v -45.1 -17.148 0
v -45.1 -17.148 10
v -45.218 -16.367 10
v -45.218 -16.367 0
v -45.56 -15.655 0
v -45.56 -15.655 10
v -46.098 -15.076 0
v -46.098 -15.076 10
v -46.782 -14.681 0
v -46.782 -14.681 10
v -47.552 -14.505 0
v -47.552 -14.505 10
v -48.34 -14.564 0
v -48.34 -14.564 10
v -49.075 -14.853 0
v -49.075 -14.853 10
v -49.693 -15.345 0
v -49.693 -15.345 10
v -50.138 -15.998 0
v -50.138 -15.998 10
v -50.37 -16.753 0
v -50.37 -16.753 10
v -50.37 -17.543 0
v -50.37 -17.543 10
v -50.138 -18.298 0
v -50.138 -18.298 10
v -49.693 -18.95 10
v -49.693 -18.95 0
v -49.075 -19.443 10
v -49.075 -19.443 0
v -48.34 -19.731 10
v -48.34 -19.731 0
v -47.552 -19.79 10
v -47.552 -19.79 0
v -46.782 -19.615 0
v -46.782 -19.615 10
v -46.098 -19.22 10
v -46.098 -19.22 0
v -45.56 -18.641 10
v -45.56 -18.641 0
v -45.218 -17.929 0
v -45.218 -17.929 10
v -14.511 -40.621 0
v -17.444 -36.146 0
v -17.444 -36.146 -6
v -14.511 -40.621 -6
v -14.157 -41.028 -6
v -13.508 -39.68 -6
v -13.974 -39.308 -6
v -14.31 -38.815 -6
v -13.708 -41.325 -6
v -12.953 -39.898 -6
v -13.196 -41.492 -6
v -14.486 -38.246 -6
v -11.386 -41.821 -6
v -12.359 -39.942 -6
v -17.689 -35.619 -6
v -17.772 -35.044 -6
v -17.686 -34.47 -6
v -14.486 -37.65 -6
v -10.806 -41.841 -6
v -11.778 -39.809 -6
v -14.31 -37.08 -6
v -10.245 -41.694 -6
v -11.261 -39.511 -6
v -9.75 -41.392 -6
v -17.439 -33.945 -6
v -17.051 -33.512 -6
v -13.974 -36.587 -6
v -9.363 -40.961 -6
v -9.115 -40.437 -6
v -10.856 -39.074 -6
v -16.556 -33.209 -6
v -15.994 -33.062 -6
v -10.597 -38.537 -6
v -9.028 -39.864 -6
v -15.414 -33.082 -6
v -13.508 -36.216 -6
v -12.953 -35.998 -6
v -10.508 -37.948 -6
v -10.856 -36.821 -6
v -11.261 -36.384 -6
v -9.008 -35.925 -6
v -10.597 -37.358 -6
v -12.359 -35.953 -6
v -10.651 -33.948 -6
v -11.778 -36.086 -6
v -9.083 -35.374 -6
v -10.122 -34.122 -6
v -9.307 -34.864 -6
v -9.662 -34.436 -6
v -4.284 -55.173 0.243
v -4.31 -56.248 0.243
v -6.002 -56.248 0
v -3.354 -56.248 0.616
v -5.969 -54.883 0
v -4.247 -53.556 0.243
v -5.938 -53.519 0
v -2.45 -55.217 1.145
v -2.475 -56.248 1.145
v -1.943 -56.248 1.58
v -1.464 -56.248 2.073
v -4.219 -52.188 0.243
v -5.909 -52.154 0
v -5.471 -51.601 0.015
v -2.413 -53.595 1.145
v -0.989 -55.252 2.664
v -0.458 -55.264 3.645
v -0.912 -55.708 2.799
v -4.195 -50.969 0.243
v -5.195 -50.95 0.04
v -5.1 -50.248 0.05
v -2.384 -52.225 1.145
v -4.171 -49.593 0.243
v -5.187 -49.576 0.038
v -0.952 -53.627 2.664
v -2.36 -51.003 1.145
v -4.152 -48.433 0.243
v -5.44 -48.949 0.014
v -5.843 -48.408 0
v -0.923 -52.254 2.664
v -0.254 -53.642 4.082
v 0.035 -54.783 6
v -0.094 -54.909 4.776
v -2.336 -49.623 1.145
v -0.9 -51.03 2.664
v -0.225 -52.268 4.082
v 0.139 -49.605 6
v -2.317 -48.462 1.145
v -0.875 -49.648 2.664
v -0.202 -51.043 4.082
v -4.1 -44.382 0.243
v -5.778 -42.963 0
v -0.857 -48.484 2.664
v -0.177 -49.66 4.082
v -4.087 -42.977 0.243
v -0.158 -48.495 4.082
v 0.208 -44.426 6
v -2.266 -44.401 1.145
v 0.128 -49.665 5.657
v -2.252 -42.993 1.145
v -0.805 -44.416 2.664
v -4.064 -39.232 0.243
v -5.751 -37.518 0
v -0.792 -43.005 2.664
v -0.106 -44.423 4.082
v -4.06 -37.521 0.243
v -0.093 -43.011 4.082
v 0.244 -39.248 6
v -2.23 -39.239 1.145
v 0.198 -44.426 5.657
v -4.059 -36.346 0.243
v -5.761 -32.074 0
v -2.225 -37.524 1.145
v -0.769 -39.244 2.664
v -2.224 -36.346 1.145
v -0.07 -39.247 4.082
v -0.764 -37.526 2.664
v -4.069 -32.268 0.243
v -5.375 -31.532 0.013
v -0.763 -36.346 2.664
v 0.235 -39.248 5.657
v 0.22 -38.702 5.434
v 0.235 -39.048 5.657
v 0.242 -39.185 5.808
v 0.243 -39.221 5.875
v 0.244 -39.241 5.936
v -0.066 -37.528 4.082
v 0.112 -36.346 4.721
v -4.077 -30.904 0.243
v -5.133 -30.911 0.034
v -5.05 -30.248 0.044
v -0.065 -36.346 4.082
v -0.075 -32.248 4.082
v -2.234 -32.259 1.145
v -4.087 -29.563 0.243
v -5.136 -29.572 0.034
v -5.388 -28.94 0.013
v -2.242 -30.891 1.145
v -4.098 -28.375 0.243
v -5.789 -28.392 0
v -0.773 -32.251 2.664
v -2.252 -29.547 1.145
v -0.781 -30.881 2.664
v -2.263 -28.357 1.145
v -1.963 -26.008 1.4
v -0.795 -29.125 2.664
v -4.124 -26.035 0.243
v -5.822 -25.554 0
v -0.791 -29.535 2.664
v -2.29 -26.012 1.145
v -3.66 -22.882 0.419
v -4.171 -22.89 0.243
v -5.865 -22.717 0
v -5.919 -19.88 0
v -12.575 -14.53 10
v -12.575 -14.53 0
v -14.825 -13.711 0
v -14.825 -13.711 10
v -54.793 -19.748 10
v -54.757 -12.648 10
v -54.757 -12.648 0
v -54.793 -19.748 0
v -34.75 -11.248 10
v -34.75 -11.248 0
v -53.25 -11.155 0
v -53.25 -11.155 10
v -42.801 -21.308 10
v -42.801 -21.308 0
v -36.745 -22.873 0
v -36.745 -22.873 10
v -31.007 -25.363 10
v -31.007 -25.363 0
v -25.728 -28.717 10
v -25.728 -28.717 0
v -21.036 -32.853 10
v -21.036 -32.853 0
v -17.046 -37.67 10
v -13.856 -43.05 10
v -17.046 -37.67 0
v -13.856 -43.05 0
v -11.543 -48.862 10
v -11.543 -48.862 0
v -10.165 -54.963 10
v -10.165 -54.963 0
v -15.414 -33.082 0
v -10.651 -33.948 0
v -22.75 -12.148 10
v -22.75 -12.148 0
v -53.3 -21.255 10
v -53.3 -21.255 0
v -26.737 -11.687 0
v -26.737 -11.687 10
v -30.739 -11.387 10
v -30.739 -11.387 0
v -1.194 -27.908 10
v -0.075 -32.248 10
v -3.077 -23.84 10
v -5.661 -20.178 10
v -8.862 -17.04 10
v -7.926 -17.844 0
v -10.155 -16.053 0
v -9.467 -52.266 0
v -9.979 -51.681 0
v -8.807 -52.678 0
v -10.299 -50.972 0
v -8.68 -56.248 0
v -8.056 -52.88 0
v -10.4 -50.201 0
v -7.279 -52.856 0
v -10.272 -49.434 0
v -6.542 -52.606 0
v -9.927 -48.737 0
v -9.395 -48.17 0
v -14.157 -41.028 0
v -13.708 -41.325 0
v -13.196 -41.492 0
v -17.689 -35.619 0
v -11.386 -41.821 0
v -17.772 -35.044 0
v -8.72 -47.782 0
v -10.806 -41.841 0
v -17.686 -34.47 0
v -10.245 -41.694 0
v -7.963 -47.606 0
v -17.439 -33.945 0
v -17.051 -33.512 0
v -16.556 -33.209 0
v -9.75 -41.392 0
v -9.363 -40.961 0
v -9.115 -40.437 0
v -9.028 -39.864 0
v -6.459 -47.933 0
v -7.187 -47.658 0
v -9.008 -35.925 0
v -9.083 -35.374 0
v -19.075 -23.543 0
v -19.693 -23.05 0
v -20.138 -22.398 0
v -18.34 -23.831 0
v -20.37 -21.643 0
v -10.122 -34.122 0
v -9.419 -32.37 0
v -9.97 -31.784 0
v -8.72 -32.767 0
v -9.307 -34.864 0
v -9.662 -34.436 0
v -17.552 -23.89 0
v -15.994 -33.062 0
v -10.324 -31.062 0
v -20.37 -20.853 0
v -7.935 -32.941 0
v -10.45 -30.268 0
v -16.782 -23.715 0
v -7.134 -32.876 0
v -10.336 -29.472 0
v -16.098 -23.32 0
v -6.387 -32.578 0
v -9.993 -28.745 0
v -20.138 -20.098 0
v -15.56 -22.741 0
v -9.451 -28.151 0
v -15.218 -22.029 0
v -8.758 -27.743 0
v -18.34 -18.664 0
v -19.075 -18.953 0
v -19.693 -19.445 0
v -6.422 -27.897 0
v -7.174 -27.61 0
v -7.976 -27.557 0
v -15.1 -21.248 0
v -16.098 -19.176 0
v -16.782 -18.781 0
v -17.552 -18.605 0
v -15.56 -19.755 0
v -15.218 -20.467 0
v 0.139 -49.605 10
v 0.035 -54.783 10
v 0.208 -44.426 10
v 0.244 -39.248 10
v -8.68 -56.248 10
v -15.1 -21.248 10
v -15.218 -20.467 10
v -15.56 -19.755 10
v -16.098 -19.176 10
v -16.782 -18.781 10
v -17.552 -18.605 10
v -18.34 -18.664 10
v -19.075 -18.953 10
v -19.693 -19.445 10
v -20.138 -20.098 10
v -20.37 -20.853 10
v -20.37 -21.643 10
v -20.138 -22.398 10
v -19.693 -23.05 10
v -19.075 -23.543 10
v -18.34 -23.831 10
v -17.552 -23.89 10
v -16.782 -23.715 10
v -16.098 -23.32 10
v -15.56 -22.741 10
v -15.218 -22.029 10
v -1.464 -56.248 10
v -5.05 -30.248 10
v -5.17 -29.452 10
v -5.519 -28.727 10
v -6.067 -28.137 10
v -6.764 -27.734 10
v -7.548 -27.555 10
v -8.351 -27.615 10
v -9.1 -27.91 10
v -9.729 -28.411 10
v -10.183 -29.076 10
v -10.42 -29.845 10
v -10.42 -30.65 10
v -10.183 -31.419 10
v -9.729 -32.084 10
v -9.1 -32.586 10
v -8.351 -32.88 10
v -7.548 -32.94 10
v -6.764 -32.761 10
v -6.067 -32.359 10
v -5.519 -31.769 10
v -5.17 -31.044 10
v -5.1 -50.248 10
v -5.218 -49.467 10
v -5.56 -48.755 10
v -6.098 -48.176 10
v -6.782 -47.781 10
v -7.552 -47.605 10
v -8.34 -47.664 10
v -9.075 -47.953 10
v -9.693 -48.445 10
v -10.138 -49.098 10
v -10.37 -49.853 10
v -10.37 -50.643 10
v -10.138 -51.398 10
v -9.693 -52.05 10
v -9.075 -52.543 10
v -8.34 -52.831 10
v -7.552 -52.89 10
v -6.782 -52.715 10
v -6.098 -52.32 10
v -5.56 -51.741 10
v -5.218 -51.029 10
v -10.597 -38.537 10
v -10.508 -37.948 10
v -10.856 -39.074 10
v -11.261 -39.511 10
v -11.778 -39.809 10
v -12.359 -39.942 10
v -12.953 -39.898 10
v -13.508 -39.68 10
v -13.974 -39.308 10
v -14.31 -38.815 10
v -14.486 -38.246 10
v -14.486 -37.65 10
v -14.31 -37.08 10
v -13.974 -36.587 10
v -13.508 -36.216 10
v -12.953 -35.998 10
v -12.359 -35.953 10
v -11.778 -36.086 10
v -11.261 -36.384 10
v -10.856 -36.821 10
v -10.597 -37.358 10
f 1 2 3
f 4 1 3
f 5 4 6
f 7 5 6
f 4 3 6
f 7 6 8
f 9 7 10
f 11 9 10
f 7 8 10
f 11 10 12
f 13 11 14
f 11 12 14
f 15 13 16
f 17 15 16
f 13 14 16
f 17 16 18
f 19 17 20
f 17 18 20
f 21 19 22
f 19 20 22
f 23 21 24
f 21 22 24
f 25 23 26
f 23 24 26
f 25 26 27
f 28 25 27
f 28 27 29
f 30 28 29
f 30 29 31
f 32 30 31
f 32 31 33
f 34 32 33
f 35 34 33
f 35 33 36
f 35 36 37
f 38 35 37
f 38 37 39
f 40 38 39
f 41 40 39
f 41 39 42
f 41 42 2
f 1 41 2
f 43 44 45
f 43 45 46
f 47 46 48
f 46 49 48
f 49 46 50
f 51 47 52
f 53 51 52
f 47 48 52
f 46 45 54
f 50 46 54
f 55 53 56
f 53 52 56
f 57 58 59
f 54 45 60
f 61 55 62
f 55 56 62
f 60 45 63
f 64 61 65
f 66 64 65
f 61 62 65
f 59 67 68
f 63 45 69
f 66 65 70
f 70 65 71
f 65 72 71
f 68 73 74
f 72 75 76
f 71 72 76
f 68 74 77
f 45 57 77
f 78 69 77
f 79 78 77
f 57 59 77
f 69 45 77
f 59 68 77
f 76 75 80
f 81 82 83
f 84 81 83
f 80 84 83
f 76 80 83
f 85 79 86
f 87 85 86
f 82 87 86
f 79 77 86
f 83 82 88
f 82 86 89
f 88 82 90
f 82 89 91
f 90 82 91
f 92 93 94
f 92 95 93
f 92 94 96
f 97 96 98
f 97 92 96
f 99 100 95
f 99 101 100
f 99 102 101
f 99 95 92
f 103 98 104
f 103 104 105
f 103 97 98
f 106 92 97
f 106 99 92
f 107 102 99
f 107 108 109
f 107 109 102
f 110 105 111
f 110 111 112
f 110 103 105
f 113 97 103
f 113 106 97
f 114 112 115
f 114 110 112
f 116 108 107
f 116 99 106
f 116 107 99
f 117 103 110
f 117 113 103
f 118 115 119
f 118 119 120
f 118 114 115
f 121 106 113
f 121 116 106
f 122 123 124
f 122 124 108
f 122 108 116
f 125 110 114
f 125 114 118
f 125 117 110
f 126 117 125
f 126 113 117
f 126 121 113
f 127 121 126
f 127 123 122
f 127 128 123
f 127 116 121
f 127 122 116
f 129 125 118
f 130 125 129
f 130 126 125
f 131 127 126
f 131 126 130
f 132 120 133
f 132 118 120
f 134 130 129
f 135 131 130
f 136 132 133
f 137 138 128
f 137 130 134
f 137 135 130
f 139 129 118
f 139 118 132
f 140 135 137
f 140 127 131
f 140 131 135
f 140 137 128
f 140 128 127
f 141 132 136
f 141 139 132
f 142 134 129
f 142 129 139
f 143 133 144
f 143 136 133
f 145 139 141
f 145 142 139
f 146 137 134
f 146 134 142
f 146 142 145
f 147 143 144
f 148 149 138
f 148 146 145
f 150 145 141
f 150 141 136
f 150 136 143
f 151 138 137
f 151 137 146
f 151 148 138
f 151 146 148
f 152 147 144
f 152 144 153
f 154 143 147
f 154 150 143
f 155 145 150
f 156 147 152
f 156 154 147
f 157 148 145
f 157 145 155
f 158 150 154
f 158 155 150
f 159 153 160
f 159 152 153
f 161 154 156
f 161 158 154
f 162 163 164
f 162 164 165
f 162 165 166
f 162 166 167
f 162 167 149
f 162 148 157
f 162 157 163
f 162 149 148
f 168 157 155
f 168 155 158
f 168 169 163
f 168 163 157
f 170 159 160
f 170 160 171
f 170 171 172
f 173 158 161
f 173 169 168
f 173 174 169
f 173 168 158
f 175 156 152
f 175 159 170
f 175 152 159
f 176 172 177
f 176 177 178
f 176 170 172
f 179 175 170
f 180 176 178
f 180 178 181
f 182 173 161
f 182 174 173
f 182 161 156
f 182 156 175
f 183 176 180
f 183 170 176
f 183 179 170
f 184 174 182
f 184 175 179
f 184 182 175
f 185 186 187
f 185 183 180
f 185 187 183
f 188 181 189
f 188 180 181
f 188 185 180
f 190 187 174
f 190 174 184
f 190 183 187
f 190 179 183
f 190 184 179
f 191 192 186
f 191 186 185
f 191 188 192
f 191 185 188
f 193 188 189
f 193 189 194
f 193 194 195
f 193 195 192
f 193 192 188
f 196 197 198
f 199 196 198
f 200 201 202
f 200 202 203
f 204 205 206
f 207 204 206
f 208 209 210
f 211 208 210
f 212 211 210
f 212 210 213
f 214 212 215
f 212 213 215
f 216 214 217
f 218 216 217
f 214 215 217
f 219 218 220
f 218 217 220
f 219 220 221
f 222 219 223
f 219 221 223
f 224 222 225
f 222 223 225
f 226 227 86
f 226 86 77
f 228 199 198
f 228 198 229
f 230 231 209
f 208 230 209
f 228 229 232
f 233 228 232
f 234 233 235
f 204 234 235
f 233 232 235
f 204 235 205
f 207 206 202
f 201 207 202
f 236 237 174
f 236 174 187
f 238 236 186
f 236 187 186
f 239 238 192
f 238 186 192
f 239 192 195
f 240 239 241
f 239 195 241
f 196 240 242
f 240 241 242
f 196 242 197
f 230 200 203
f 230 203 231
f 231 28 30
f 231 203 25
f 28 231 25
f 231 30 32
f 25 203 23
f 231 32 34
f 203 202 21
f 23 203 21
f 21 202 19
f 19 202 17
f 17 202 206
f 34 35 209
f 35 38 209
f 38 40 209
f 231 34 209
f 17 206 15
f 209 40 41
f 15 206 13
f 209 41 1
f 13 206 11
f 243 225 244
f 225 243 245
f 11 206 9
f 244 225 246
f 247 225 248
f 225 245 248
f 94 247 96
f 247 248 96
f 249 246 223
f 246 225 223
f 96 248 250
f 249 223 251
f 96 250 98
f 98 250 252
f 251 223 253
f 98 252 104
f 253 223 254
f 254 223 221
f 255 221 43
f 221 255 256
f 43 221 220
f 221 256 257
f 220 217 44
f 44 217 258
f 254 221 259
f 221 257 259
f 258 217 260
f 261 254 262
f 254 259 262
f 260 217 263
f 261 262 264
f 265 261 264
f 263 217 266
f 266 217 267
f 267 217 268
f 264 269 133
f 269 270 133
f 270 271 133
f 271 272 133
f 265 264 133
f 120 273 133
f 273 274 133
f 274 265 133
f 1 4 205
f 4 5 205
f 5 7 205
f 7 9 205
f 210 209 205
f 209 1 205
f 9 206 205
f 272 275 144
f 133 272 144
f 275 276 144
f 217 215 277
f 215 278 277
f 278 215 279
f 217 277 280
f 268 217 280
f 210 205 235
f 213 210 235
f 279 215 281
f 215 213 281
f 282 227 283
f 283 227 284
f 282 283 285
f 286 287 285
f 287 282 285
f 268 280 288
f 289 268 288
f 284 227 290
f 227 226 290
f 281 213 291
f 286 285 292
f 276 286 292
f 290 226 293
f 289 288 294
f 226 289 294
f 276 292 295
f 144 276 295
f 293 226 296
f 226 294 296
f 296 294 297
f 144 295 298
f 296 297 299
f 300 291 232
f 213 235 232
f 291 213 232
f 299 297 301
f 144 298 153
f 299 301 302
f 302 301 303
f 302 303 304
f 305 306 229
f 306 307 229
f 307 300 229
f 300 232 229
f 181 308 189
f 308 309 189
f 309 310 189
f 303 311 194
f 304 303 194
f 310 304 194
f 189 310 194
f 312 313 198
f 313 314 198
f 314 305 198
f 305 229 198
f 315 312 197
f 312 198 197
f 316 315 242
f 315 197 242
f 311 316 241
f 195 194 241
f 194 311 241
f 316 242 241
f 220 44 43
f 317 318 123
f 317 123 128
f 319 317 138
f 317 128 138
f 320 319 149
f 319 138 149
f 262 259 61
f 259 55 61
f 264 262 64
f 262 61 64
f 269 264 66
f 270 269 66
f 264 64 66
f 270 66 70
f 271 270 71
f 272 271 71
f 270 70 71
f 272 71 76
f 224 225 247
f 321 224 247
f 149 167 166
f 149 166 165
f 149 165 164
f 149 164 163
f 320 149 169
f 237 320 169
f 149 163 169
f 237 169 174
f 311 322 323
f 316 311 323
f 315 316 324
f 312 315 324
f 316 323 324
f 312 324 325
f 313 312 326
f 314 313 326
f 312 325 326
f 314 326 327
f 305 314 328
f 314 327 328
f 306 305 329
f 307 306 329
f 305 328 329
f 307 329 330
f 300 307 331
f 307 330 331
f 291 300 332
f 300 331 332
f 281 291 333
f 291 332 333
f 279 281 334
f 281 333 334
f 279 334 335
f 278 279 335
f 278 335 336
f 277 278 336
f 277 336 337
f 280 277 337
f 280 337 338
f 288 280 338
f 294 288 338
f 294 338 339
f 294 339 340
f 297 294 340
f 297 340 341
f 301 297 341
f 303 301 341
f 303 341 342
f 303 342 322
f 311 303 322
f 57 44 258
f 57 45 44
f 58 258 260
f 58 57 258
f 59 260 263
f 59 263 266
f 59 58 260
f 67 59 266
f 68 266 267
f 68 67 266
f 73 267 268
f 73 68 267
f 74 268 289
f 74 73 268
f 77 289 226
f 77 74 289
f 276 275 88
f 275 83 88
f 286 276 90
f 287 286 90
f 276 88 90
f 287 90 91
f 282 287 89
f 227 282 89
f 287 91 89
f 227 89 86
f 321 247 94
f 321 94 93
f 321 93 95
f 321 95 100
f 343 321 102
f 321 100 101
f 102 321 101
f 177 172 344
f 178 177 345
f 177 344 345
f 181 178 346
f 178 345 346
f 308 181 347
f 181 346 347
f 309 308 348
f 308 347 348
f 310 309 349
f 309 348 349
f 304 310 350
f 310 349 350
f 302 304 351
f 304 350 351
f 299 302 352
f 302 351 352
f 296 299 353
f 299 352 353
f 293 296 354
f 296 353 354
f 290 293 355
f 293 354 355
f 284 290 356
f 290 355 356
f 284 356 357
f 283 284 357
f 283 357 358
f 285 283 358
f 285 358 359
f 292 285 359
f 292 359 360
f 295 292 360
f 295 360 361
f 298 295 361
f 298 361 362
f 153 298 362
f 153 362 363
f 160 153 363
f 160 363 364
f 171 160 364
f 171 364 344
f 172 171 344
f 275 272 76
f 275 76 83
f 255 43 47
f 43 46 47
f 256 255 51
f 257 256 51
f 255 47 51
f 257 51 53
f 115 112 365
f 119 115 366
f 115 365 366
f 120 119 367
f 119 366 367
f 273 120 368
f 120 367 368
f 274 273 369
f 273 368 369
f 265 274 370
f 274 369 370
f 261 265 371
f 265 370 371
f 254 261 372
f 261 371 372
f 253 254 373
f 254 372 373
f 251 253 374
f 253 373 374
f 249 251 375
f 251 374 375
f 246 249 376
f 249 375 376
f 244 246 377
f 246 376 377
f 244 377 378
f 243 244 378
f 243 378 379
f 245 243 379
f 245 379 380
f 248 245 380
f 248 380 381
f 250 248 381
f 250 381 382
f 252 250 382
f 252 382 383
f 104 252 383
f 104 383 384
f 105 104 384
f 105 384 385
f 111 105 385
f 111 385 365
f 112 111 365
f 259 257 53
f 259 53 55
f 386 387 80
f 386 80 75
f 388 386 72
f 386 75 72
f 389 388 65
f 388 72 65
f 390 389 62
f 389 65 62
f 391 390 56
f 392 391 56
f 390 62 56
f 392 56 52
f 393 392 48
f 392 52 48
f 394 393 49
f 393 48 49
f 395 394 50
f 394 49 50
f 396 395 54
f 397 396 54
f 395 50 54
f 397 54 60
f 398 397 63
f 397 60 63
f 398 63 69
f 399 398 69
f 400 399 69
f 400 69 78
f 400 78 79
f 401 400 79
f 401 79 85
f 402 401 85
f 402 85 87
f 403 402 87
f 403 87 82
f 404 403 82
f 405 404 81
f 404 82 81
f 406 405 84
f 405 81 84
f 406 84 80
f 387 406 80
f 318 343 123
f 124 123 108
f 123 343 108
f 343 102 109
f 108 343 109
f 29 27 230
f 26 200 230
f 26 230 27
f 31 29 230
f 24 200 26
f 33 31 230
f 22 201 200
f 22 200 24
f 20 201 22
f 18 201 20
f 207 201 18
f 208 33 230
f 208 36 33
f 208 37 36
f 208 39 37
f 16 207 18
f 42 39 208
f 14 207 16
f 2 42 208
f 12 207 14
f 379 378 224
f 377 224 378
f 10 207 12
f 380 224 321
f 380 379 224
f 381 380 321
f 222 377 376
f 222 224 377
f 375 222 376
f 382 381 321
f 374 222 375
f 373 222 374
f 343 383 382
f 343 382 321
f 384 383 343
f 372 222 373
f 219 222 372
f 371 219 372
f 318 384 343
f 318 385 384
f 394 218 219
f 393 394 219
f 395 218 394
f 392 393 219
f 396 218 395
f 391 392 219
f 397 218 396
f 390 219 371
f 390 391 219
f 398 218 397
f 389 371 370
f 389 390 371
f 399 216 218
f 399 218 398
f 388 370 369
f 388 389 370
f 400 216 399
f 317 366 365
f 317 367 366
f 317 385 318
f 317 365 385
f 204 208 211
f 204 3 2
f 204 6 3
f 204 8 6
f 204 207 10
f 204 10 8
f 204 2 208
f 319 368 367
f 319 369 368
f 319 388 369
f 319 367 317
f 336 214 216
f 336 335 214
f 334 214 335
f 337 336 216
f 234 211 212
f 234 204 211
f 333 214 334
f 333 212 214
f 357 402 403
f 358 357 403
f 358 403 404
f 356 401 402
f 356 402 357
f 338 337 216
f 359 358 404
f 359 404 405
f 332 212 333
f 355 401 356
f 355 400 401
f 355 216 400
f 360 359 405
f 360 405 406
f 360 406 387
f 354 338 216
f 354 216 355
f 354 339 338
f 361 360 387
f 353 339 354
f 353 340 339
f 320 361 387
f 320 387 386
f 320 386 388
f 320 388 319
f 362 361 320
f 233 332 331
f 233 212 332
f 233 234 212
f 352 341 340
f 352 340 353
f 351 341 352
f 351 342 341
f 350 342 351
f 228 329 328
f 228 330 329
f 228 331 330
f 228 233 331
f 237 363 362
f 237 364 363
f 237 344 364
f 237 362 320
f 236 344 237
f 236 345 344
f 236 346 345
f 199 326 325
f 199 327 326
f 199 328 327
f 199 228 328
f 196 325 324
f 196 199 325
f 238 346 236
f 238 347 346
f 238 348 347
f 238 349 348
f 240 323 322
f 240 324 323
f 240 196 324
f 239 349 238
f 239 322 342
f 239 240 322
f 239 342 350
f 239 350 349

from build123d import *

# Parameters (mm, degrees)
F1_DEPTH    = 10
F2_R        = 2.65
F2_R_2      = 2.7
F3_DEPTH    = 10.001
F4_T2_ANGLE = 6.3743045961
F6_DEPTH    = 6
F7_R        = 2
F8_T1_DEPTH = 17.7150489639
F8_T3_DEPTH = 16.827176909
F8_T5_DEPTH = 14.1871505468
F9_T1_DEPTH = 16.8101610382
F10_R       = 2
F11_DEPTH   = 16


# Not quite as in the source:
# - a fillet or chamfer that OpenCascade refuses, or shapes differently, is made with other operations: its cross-section is extruded or revolved along the edge and cut away or added
# - a feature names something its author has since deleted; it is built from what else it names


with BuildPart() as f1:
    # F0 (on Top) → F1 (new body)
    with BuildSketch(Plane.XY):
        with BuildLine():
            Line((-34.7499609253, -11.2477834763), (-54.7499609253, -11.1477834763))
            Line((-54.7499609253, -11.1477834763), (-54.8004609253, -21.2477834763))
            Line((-54.8004609253, -21.2477834763), (-42.8006109225, -21.3077827264))
            ThreePointArc((-42.8006109225, -21.3077827264), (-20.5885311059, -33.3218659489), (-10, -56.2477834763))
            Line((-10, -56.2477834763), (0, -56.2477834763))
            ThreePointArc((0, -56.2477834763), (0.1673692192, -47.7484327866), (0.2444140549, -39.2477834763))
            Line((0.2444140549, -39.2477834763), (-0.07466726, -32.2477834763))
            ThreePointArc((-0.07466726, -32.2477834763), (-4.6744272783, -21.4152799032), (-13.7499609253, -13.9229094565))
            Line((-13.7499609253, -13.9229094565), (-22.7499609253, -12.1477834763))
            ThreePointArc((-22.7499609253, -12.1477834763), (-28.7364107349, -11.5171142711), (-34.7499609253, -11.2477834763))
        make_face()
    extrude(amount=F1_DEPTH)

    # F2 (on face) → F3 (cut, through all)
    with BuildSketch(Plane.XY.offset(10)):
        with Locations((-47.7499609253, -17.1477834763)):
            Circle(F2_R)
        with Locations((-17.7499609253, -21.2477834763)):
            Circle(F2_R)
        with Locations((-7.7499609253, -50.2477834763)):
            Circle(F2_R)
        with Locations((-7.7499609253, -30.2477834763)):
            Circle(F2_R_2)
    extrude(amount=-F3_DEPTH, mode=Mode.SUBTRACT)

    # F4: fillet of radius 6 on 1 edges, made by hand

    # F4_s1 → F4_t2 (revolve, cut)
    with BuildSketch(Plane(origin=(-6.441827323, -91.8723118046, 0), x_dir=(0, 0, 1), z_dir=(-0.0699454492, -0.9975508178, 0))):
        with BuildLine():
            ThreePointArc((0, 1.2558600799), (1.7573593129, -2.9867806073), (6, -4.7441399201))
            Line((6, -4.7441399201), (6, -4.8641399201))
            Line((6, -4.8641399201), (-0.12, -4.8641399201))
            Line((-0.12, -4.8641399201), (-0.12, 1.2558600799))
            Line((-0.12, 1.2558600799), (0, 1.2558600799))
        make_face()
    revolve(axis=Axis((-799.7499609255, -36.2477834763, 0), (0, 0, 1)), revolution_arc=F4_T2_ANGLE, mode=Mode.SUBTRACT)

    # F5 (on face) → F6 (join)
    with BuildSketch(Plane.XY):
        Polygon((-20, -32.2477834763), (-14.04, -41.3386925673), (-9.04, -42.2477834763), (-9, -34.2477834763), align=None)
    extrude(amount=-F6_DEPTH)

    # F7
    f7_edges = [f1.edges().sort_by_distance(p)[0] for p in [
        (-9, -34.247783, -3),
        (-20, -32.247783, -3),
        (-14.04, -41.338693, -3),
        (-9.04, -42.247783, -3),
    ]]
    fillet(f7_edges, radius=F7_R)

    # F8: chamfer of 1.5 on 4 edges, made by hand

    # F8_s2 → F8_t1 (cut)
    with BuildSketch(Plane.XY.offset(-3.8575244819)):
        Polygon((-53.2499796749, -11.1552833826), (-54.7574608315, -12.6477647267), (-54.7499609253, -11.1477834763), align=None)
        Polygon((-54.792961019, -19.747802226), (-53.3004796749, -21.2552833826), (-54.8004609253, -21.2477834763), align=None)
    extrude(amount=F8_T1_DEPTH, mode=Mode.SUBTRACT)

    # F8_s4 → F8_t3 (cut)
    with BuildSketch(Plane.XY.offset(-3.4135884545)):
        with BuildLine():
            Line((-10.1649915082, -54.9628953089), (-8.6804960049, -56.2477834763))
            Line((-8.6804960049, -56.2477834763), (-10, -56.2477834763))
            ThreePointArc((-10, -56.2477834763), (-10.0801500361, -55.5824778984), (-10.1649915082, -54.9628953089))
        make_face()
    extrude(amount=F8_T3_DEPTH, mode=Mode.SUBTRACT)

    # F8_s6 → F8_t5 (cut)
    with BuildSketch(Plane.XY.offset(-0.4141318258)):
        with BuildLine():
            Line((-1.4642977695, -56.2477834763), (0.0352995939, -54.7825361376))
            ThreePointArc((0.0352995939, -54.7825361376), (0.0185023043, -55.4936979353), (0, -56.2477834763))
            Line((0, -56.2477834763), (-1.4642977695, -56.2477834763))
        make_face()
    extrude(amount=F8_T5_DEPTH, mode=Mode.SUBTRACT)

    # F9: chamfer of 1 on 1 edges, made by hand

    # F9_s2 → F9_t1 (cut)
    with BuildSketch(Plane.XY.offset(-3.4050805191)):
        with BuildLine():
            Line((-12.5377780347, -14.5439926831), (-14.8624749797, -13.6972040173))
            Line((-14.8624749797, -13.6972040173), (-14.8586048158, -13.6775820441))
            ThreePointArc((-14.8586048158, -13.6775820441), (-14.3029436702, -13.7934559205), (-13.7460907615, -13.9032874834))
            Line((-13.7460907615, -13.9032874834), (-13.7412512479, -13.9049055259))
            ThreePointArc((-13.7412512479, -13.9049055259), (-13.1317908034, -14.2101386142), (-12.5281211003, -14.5264785854))
            Line((-12.5281211003, -14.5264785854), (-12.5377780347, -14.5439926831))
        make_face()
    extrude(amount=F9_T1_DEPTH, mode=Mode.SUBTRACT)

    # F10 (on face) → F11 (cut, through all)
    with BuildSketch(Plane(origin=(0, 0, -6), x_dir=(1, 0, 0), z_dir=(0, 0, -1))):
        with Locations((-12.50838816, 37.9476757883)):
            Circle(F10_R)
    extrude(amount=-F11_DEPTH, mode=Mode.SUBTRACT)


solid = f1.part
